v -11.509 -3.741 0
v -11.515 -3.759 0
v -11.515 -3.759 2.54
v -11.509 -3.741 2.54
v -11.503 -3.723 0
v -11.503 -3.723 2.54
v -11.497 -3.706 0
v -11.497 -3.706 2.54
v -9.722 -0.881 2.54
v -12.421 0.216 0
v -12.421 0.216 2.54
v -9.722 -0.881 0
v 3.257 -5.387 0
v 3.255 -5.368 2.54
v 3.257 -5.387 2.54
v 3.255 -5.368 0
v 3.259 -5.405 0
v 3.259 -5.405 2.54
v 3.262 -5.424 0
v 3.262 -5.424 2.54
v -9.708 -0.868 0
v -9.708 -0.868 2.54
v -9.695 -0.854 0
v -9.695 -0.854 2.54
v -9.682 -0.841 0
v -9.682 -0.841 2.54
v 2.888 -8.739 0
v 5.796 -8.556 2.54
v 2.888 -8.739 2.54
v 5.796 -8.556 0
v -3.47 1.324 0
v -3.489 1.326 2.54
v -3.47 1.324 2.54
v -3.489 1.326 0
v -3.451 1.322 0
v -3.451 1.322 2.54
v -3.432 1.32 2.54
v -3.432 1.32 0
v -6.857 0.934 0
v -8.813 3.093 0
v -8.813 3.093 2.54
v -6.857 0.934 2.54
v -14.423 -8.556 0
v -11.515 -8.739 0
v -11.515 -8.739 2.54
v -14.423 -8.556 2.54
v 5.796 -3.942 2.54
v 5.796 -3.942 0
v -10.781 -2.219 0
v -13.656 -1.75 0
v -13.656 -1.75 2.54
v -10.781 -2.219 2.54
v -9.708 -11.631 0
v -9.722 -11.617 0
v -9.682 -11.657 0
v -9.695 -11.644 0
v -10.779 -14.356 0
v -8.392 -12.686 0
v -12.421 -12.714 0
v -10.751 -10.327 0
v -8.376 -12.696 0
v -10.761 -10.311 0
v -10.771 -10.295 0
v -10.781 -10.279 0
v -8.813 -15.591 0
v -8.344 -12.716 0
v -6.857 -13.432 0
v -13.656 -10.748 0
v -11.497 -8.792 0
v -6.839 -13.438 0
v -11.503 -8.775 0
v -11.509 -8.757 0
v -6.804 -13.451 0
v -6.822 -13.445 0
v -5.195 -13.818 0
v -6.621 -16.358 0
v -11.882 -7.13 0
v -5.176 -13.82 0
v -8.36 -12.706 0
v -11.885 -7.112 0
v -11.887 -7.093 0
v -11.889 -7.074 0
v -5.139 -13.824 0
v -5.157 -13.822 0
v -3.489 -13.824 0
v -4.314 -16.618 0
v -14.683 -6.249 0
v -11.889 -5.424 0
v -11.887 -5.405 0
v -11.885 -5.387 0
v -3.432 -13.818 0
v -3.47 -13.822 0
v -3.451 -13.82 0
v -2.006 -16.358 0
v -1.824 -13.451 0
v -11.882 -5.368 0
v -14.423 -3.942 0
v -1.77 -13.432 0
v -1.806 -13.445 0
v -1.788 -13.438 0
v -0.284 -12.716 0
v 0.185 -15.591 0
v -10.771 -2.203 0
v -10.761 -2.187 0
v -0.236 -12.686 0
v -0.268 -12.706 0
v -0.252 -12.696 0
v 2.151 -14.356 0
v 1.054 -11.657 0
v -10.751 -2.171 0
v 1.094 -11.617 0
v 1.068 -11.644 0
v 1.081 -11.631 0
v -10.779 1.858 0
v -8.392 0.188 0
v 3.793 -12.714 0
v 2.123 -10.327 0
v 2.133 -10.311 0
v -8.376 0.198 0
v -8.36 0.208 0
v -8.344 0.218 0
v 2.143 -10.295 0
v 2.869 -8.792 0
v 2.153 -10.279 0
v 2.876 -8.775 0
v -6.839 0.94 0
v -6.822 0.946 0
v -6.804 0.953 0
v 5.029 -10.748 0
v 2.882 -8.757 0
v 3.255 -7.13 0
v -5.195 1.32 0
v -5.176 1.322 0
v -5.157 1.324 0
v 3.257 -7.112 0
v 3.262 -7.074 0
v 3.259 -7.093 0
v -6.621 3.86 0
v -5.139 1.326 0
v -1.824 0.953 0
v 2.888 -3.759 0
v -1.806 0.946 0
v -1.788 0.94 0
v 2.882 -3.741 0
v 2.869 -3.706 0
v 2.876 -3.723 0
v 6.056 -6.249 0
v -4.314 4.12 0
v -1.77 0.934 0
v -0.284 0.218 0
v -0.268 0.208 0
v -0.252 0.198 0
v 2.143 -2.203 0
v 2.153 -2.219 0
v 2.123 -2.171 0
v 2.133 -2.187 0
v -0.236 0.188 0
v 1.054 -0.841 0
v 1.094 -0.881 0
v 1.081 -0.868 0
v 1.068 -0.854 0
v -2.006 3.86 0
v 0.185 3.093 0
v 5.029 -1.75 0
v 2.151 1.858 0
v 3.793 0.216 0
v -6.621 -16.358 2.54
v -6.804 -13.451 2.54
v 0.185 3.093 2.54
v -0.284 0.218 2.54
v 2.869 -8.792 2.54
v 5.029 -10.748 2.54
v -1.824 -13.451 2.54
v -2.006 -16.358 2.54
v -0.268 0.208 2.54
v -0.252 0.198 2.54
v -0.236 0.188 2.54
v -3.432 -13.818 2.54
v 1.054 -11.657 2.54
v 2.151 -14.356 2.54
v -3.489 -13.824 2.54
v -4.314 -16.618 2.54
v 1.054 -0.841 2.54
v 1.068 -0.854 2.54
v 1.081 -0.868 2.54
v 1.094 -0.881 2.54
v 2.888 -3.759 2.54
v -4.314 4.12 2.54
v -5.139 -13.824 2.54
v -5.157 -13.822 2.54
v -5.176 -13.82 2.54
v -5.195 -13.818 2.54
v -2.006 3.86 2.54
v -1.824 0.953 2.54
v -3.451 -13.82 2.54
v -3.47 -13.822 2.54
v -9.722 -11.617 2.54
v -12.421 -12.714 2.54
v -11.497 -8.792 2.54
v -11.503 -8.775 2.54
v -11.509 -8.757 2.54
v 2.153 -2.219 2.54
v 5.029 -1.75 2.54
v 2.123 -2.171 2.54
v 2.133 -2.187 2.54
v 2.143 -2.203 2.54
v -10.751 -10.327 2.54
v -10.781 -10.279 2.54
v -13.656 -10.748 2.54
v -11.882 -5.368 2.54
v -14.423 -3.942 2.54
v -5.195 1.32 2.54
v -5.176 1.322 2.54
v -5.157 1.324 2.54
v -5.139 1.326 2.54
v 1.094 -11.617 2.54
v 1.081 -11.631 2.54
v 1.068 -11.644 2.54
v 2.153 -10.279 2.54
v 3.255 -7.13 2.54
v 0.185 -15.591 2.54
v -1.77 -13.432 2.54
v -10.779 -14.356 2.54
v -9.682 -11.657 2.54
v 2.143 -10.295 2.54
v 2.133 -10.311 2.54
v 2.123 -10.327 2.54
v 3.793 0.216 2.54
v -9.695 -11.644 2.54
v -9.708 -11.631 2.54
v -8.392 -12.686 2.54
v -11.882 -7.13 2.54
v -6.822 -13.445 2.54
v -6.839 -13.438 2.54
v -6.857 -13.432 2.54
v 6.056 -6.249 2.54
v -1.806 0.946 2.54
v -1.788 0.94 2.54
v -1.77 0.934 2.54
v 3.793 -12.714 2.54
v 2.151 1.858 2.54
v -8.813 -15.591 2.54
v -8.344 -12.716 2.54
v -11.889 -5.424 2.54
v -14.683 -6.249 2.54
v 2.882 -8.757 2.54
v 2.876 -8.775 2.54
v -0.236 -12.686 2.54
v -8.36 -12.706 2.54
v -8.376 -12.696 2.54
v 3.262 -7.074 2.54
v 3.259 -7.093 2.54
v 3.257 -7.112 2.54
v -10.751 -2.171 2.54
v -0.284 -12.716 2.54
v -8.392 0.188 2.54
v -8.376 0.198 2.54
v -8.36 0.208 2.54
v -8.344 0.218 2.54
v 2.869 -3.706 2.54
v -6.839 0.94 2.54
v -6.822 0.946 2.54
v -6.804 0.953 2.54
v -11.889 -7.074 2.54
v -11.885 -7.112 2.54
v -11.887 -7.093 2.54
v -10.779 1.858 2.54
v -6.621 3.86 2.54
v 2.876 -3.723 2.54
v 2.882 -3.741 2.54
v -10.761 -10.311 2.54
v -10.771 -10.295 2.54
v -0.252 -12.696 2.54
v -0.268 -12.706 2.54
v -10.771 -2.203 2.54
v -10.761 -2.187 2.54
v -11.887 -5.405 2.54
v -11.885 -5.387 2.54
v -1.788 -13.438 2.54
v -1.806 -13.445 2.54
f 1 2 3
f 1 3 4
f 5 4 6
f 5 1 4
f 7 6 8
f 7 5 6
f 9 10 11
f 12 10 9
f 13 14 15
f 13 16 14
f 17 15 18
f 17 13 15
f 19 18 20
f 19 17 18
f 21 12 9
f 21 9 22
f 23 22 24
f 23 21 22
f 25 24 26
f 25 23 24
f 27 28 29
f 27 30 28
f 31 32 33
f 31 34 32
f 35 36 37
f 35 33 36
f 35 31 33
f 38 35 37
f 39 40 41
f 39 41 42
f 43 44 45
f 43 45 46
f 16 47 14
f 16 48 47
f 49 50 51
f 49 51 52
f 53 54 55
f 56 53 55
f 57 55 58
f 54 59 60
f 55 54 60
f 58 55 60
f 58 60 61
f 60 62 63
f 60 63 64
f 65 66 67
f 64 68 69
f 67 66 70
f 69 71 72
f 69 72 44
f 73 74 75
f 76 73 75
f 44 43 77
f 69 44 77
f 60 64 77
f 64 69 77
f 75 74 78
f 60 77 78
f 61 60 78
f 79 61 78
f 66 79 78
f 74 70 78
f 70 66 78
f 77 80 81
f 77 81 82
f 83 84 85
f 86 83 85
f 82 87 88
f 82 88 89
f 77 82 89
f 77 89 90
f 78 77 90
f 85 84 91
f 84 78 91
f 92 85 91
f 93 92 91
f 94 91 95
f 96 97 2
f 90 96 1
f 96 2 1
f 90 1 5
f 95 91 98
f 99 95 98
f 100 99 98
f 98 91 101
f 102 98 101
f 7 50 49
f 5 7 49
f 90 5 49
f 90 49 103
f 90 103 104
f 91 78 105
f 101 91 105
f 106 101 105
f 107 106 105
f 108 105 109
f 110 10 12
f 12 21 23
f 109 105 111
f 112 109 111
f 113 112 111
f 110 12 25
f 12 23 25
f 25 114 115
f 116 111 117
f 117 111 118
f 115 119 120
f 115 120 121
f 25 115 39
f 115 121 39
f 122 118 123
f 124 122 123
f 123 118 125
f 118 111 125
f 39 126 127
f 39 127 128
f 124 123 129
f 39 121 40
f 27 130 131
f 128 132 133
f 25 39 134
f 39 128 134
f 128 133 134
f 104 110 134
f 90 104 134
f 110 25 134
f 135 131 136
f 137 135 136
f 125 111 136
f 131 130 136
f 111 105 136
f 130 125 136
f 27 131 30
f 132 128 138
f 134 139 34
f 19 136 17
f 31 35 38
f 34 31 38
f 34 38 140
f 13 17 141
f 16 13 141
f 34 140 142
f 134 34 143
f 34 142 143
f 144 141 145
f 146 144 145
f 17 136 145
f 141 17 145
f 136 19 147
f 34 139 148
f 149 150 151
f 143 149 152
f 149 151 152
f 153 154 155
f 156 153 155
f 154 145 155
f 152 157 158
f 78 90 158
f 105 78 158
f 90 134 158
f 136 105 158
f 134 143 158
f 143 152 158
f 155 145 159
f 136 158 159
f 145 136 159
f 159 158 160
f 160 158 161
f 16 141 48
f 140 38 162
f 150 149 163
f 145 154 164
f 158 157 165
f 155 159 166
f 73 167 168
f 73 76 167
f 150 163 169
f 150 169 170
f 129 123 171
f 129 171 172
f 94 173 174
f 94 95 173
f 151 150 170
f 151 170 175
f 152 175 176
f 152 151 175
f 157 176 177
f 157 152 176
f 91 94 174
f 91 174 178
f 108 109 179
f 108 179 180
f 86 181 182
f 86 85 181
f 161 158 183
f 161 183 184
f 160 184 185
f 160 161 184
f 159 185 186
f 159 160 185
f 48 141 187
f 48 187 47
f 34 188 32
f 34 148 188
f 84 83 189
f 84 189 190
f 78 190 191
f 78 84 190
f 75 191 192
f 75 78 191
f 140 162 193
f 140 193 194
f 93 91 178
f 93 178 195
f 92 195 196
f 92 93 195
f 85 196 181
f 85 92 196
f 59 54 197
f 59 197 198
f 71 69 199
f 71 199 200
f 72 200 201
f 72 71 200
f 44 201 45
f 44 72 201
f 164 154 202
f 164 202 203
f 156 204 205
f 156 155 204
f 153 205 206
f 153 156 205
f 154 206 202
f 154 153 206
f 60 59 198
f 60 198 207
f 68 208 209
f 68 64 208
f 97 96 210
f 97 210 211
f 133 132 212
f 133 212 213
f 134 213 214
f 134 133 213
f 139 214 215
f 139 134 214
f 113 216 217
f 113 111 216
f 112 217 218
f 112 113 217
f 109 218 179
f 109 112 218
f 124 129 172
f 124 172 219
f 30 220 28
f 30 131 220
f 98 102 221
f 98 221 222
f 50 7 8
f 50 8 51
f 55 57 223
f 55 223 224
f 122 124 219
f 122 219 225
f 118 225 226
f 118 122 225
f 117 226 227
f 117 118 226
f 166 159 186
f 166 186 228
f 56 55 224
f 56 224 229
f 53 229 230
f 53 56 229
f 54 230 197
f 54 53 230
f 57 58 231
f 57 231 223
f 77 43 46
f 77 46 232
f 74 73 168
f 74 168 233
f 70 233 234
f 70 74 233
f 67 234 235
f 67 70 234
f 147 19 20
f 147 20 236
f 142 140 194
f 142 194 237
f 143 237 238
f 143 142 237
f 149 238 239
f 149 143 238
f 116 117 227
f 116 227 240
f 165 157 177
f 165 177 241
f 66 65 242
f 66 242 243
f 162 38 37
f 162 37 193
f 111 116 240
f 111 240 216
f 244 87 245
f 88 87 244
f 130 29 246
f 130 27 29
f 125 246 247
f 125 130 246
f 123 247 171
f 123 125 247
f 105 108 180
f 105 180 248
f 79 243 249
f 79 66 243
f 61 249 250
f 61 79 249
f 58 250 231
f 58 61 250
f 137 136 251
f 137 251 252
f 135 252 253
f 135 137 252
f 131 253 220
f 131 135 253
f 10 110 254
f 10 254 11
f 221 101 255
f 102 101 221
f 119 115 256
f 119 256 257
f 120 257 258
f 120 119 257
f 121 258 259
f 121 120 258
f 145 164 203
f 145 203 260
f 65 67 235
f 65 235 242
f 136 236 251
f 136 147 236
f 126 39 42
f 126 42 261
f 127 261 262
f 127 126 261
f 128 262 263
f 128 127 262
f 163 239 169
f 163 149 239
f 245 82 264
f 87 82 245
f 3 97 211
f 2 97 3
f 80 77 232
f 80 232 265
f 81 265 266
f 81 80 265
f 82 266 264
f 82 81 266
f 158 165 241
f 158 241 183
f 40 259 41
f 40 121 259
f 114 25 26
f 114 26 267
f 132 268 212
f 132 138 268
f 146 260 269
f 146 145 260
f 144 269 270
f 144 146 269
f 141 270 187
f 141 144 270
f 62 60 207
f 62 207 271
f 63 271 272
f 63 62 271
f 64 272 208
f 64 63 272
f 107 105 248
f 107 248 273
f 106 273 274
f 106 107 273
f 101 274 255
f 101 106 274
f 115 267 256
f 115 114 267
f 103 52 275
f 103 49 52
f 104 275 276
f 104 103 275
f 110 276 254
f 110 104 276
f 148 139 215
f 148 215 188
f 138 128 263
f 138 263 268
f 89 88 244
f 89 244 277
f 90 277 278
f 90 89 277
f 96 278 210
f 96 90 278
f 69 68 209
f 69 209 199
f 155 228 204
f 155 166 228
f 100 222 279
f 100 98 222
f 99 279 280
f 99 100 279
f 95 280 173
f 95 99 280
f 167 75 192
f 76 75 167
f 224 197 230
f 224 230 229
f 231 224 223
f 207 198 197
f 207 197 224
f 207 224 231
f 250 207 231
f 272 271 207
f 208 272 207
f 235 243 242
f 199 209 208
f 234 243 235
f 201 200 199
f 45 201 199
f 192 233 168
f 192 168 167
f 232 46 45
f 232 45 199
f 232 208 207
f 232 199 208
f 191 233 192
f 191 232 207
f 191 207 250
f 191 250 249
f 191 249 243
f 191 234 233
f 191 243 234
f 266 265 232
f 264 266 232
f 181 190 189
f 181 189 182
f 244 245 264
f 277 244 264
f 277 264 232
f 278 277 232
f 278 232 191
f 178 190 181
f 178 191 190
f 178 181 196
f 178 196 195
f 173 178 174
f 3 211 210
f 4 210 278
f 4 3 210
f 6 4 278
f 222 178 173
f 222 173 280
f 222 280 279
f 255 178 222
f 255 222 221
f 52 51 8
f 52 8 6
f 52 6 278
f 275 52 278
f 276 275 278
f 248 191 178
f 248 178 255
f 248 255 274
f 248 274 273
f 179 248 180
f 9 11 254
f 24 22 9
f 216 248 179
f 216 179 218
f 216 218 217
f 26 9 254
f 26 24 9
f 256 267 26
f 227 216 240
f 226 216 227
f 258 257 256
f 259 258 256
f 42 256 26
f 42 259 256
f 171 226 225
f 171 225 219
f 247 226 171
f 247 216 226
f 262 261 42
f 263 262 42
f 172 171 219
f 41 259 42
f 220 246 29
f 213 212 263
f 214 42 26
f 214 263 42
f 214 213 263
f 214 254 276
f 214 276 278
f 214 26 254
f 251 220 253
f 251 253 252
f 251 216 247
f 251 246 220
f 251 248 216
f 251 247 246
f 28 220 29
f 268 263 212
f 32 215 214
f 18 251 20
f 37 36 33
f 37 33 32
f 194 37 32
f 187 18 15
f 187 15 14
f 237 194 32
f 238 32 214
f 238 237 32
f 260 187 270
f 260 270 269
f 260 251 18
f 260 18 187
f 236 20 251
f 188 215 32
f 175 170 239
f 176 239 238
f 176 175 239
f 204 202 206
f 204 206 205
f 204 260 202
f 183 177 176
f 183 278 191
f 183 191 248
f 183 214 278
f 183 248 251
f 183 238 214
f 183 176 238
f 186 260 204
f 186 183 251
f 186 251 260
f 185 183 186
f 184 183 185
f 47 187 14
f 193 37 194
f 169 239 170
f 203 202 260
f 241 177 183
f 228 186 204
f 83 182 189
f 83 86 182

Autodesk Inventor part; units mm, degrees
ref_plane "YZ Plane" through (0, 0, 0) normal (1, 0, 0) x (0, 1, 0)
ref_plane "XZ Plane" through (0, 0, 0) normal (0, 1, 0) x (-1, 0, 0)
ref_plane "XY Plane" through (0, 0, 0) normal (0, 0, 1) x (1, 0, 0)
sketch "Sketch3" plane through (0, 0, 0) normal (0, 0, 1) x (1, 0, 0)
  line L0 (-5.1387, 1.3261) -> (-4.3137, 4.1201)
  line L1 (-4.3137, 4.1201) -> (-3.4886, 1.3261)
  line L2 (-4.3137, 1.3261) -> (-5.1387, 1.3261) construction
  line L3 (-4.3137, 1.3261) -> (-4.3137, 1.6791) construction
  circle A0 centre (-4.3137, -6.2491) radius 7.62 construction
  circle A1 centre (-4.3137, -6.2491) radius 7.62 construction
  line L4 (-6.8037, 0.9526) -> (-6.621, 3.8601)
  line L5 (-6.621, 3.8601) -> (-5.1949, 1.3198)
  circle A2 centre (-4.3137, -6.2491) radius 7.62 construction
  line L6 (-8.3438, 0.218) -> (-8.8127, 3.0933)
  line L7 (-8.8127, 3.0933) -> (-6.8571, 0.9339)
  circle A3 centre (-4.3137, -6.2491) radius 7.62 construction
  line L8 (-9.6818, -0.841) -> (-10.7788, 1.8579)
  line L9 (-10.7788, 1.8579) -> (-8.3917, 0.1879)
  circle A4 centre (-4.3137, -6.2491) radius 7.62 construction
  line L10 (-10.7506, -2.1711) -> (-12.4206, 0.216)
  line L11 (-12.4206, 0.216) -> (-9.7218, -0.881)
  circle A5 centre (-4.3137, -6.2491) radius 7.62 construction
  line L12 (-11.4967, -3.7057) -> (-13.656, -1.75)
  line L13 (-13.656, -1.75) -> (-10.7807, -2.219)
  circle A6 centre (-4.3137, -6.2491) radius 7.62 construction
  line L14 (-11.8825, -5.3678) -> (-14.4229, -3.9417)
  line L15 (-14.4229, -3.9417) -> (-11.5154, -3.7591)
  circle A7 centre (-4.3137, -6.2491) radius 7.62 construction
  line L16 (-11.8889, -7.0741) -> (-14.6829, -6.2491)
  line L17 (-14.6829, -6.2491) -> (-11.8889, -5.424)
  circle A8 centre (-4.3137, -6.2491) radius 7.62 construction
  line L18 (-11.5154, -8.7391) -> (-14.4229, -8.5564)
  line L19 (-14.4229, -8.5564) -> (-11.8825, -7.1303)
  circle A9 centre (-4.3137, -6.2491) radius 7.62 construction
  line L20 (-10.7807, -10.2792) -> (-13.656, -10.7481)
  line L21 (-13.656, -10.7481) -> (-11.4967, -8.7925)
  circle A10 centre (-4.3137, -6.2491) radius 7.62 construction
  line L22 (-9.7218, -11.6172) -> (-12.4206, -12.7142)
  line L23 (-12.4206, -12.7142) -> (-10.7506, -10.3271)
  circle A11 centre (-4.3137, -6.2491) radius 7.62 construction
  line L24 (-8.3917, -12.686) -> (-10.7788, -14.356)
  line L25 (-10.7788, -14.356) -> (-9.6818, -11.6572)
  circle A12 centre (-4.3137, -6.2491) radius 7.62 construction
  line L26 (-6.8571, -13.4321) -> (-8.8127, -15.5914)
  line L27 (-8.8127, -15.5914) -> (-8.3438, -12.7161)
  circle A13 centre (-4.3137, -6.2491) radius 7.62 construction
  line L28 (-5.1949, -13.8179) -> (-6.621, -16.3583)
  line L29 (-6.621, -16.3583) -> (-6.8037, -13.4508)
  circle A14 centre (-4.3137, -6.2491) radius 7.62 construction
  line L30 (-3.4886, -13.8243) -> (-4.3137, -16.6183)
  line L31 (-4.3137, -16.6183) -> (-5.1387, -13.8243)
  circle A15 centre (-4.3137, -6.2491) radius 7.62 construction
  line L32 (-1.8237, -13.4508) -> (-2.0063, -16.3583)
  line L33 (-2.0063, -16.3583) -> (-3.4324, -13.8179)
  circle A16 centre (-4.3137, -6.2491) radius 7.62 construction
  line L34 (-0.2836, -12.7161) -> (0.1853, -15.5914)
  line L35 (0.1853, -15.5914) -> (-1.7703, -13.4321)
  circle A17 centre (-4.3137, -6.2491) radius 7.62 construction
  line L36 (1.0544, -11.6572) -> (2.1514, -14.356)
  line L37 (2.1514, -14.356) -> (-0.2357, -12.686)
  circle A18 centre (-4.3137, -6.2491) radius 7.62 construction
  line L38 (2.1233, -10.3271) -> (3.7933, -12.7142)
  line L39 (3.7933, -12.7142) -> (1.0944, -11.6172)
  circle A19 centre (-4.3137, -6.2491) radius 7.62 construction
  line L40 (2.8693, -8.7925) -> (5.0286, -10.7481)
  line L41 (5.0286, -10.7481) -> (2.1534, -10.2792)
  circle A20 centre (-4.3137, -6.2491) radius 7.62 construction
  line L42 (3.2552, -7.1303) -> (5.7955, -8.5564)
  line L43 (5.7955, -8.5564) -> (2.888, -8.7391)
  circle A21 centre (-4.3137, -6.2491) radius 7.62 construction
  line L44 (3.2615, -5.424) -> (6.0555, -6.2491)
  line L45 (6.0555, -6.2491) -> (3.2615, -7.0741)
  circle A22 centre (-4.3137, -6.2491) radius 7.62 construction
  line L46 (2.888, -3.7591) -> (5.7955, -3.9417)
  line L47 (5.7955, -3.9417) -> (3.2552, -5.3678)
  circle A23 centre (-4.3137, -6.2491) radius 7.62 construction
  line L48 (2.1534, -2.219) -> (5.0286, -1.75)
  line L49 (5.0286, -1.75) -> (2.8693, -3.7057)
  circle A24 centre (-4.3137, -6.2491) radius 7.62 construction
  line L50 (1.0944, -0.881) -> (3.7933, 0.216)
  line L51 (3.7933, 0.216) -> (2.1233, -2.1711)
  circle A25 centre (-4.3137, -6.2491) radius 7.62 construction
  line L52 (-0.2357, 0.1879) -> (2.1514, 1.8579)
  line L53 (2.1514, 1.8579) -> (1.0544, -0.841)
  circle A26 centre (-4.3137, -6.2491) radius 7.62 construction
  line L54 (-1.7703, 0.9339) -> (0.1853, 3.0933)
  line L55 (0.1853, 3.0933) -> (-0.2836, 0.218)
  circle A27 centre (-4.3137, -6.2491) radius 7.62 construction
  line L56 (-3.4324, 1.3198) -> (-2.0063, 3.8601)
  line L57 (-2.0063, 3.8601) -> (-1.8237, 0.9526)
  arc A28 (-10.7506, -2.1711) -> (-10.7807, -2.219) centre (-4.3137, -6.2491) ccw
  arc A29 (-11.4967, -3.7057) -> (-11.5154, -3.7591) centre (-4.3137, -6.2491) ccw
  arc A30 (-11.8825, -5.3678) -> (-11.8889, -5.424) centre (-4.3137, -6.2491) ccw
  arc A31 (-11.8889, -7.0741) -> (-11.8825, -7.1303) centre (-4.3137, -6.2491) ccw
  arc A32 (-11.5154, -8.7391) -> (-11.4967, -8.7925) centre (-4.3137, -6.2491) ccw
  arc A33 (-10.7807, -10.2792) -> (-10.7506, -10.3271) centre (-4.3137, -6.2491) ccw
  arc A34 (-9.7218, -11.6172) -> (-9.6818, -11.6572) centre (-4.3137, -6.2491) ccw
  arc A35 (-8.3917, -12.686) -> (-8.3438, -12.7161) centre (-4.3137, -6.2491) ccw
  arc A36 (-6.8571, -13.4321) -> (-6.8037, -13.4508) centre (-4.3137, -6.2491) ccw
  arc A37 (-5.1949, -13.8179) -> (-5.1387, -13.8243) centre (-4.3137, -6.2491) ccw
  arc A38 (-3.4886, -13.8243) -> (-3.4324, -13.8179) centre (-4.3137, -6.2491) ccw
  arc A39 (-1.8237, -13.4508) -> (-1.7703, -13.4321) centre (-4.3137, -6.2491) ccw
  arc A40 (-0.2836, -12.7161) -> (-0.2357, -12.686) centre (-4.3137, -6.2491) ccw
  arc A41 (1.0544, -11.6572) -> (1.0944, -11.6172) centre (-4.3137, -6.2491) ccw
  arc A42 (2.1233, -10.3271) -> (2.1534, -10.2792) centre (-4.3137, -6.2491) ccw
  arc A43 (2.8693, -8.7925) -> (2.888, -8.7391) centre (-4.3137, -6.2491) ccw
  arc A44 (3.2552, -7.1303) -> (3.2615, -7.0741) centre (-4.3137, -6.2491) ccw
  arc A45 (3.2615, -5.424) -> (3.2552, -5.3678) centre (-4.3137, -6.2491) ccw
  arc A46 (2.888, -3.7591) -> (2.8693, -3.7057) centre (-4.3137, -6.2491) ccw
  arc A47 (2.1534, -2.219) -> (2.1233, -2.1711) centre (-4.3137, -6.2491) ccw
  arc A48 (1.0944, -0.881) -> (1.0544, -0.841) centre (-4.3137, -6.2491) ccw
  arc A49 (-0.2357, 0.1879) -> (-0.2836, 0.218) centre (-4.3137, -6.2491) ccw
  arc A50 (-1.7703, 0.9339) -> (-1.8237, 0.9526) centre (-4.3137, -6.2491) ccw
  arc A51 (-3.4324, 1.3198) -> (-3.4886, 1.3261) centre (-4.3137, -6.2491) ccw
  arc A52 (-5.1387, 1.3261) -> (-5.1949, 1.3198) centre (-4.3137, -6.2491) ccw
  arc A53 (-6.8037, 0.9526) -> (-6.8571, 0.9339) centre (-4.3137, -6.2491) ccw
  arc A54 (-8.3438, 0.218) -> (-8.3917, 0.1879) centre (-4.3137, -6.2491) ccw
  arc A55 (-9.6818, -0.841) -> (-9.7218, -0.881) centre (-4.3137, -6.2491) ccw
  point P0 (0, 0)
  dimension "d21" = 1.6501
  dimension "d22" = 2.794
  dimension "d23" = 15.24
  dimension "d26" = 360
extrude "Extrusion3" add sketch "Sketch3" along normal blind 2.54
properties part number "Big Gear Phone Case Mech"
